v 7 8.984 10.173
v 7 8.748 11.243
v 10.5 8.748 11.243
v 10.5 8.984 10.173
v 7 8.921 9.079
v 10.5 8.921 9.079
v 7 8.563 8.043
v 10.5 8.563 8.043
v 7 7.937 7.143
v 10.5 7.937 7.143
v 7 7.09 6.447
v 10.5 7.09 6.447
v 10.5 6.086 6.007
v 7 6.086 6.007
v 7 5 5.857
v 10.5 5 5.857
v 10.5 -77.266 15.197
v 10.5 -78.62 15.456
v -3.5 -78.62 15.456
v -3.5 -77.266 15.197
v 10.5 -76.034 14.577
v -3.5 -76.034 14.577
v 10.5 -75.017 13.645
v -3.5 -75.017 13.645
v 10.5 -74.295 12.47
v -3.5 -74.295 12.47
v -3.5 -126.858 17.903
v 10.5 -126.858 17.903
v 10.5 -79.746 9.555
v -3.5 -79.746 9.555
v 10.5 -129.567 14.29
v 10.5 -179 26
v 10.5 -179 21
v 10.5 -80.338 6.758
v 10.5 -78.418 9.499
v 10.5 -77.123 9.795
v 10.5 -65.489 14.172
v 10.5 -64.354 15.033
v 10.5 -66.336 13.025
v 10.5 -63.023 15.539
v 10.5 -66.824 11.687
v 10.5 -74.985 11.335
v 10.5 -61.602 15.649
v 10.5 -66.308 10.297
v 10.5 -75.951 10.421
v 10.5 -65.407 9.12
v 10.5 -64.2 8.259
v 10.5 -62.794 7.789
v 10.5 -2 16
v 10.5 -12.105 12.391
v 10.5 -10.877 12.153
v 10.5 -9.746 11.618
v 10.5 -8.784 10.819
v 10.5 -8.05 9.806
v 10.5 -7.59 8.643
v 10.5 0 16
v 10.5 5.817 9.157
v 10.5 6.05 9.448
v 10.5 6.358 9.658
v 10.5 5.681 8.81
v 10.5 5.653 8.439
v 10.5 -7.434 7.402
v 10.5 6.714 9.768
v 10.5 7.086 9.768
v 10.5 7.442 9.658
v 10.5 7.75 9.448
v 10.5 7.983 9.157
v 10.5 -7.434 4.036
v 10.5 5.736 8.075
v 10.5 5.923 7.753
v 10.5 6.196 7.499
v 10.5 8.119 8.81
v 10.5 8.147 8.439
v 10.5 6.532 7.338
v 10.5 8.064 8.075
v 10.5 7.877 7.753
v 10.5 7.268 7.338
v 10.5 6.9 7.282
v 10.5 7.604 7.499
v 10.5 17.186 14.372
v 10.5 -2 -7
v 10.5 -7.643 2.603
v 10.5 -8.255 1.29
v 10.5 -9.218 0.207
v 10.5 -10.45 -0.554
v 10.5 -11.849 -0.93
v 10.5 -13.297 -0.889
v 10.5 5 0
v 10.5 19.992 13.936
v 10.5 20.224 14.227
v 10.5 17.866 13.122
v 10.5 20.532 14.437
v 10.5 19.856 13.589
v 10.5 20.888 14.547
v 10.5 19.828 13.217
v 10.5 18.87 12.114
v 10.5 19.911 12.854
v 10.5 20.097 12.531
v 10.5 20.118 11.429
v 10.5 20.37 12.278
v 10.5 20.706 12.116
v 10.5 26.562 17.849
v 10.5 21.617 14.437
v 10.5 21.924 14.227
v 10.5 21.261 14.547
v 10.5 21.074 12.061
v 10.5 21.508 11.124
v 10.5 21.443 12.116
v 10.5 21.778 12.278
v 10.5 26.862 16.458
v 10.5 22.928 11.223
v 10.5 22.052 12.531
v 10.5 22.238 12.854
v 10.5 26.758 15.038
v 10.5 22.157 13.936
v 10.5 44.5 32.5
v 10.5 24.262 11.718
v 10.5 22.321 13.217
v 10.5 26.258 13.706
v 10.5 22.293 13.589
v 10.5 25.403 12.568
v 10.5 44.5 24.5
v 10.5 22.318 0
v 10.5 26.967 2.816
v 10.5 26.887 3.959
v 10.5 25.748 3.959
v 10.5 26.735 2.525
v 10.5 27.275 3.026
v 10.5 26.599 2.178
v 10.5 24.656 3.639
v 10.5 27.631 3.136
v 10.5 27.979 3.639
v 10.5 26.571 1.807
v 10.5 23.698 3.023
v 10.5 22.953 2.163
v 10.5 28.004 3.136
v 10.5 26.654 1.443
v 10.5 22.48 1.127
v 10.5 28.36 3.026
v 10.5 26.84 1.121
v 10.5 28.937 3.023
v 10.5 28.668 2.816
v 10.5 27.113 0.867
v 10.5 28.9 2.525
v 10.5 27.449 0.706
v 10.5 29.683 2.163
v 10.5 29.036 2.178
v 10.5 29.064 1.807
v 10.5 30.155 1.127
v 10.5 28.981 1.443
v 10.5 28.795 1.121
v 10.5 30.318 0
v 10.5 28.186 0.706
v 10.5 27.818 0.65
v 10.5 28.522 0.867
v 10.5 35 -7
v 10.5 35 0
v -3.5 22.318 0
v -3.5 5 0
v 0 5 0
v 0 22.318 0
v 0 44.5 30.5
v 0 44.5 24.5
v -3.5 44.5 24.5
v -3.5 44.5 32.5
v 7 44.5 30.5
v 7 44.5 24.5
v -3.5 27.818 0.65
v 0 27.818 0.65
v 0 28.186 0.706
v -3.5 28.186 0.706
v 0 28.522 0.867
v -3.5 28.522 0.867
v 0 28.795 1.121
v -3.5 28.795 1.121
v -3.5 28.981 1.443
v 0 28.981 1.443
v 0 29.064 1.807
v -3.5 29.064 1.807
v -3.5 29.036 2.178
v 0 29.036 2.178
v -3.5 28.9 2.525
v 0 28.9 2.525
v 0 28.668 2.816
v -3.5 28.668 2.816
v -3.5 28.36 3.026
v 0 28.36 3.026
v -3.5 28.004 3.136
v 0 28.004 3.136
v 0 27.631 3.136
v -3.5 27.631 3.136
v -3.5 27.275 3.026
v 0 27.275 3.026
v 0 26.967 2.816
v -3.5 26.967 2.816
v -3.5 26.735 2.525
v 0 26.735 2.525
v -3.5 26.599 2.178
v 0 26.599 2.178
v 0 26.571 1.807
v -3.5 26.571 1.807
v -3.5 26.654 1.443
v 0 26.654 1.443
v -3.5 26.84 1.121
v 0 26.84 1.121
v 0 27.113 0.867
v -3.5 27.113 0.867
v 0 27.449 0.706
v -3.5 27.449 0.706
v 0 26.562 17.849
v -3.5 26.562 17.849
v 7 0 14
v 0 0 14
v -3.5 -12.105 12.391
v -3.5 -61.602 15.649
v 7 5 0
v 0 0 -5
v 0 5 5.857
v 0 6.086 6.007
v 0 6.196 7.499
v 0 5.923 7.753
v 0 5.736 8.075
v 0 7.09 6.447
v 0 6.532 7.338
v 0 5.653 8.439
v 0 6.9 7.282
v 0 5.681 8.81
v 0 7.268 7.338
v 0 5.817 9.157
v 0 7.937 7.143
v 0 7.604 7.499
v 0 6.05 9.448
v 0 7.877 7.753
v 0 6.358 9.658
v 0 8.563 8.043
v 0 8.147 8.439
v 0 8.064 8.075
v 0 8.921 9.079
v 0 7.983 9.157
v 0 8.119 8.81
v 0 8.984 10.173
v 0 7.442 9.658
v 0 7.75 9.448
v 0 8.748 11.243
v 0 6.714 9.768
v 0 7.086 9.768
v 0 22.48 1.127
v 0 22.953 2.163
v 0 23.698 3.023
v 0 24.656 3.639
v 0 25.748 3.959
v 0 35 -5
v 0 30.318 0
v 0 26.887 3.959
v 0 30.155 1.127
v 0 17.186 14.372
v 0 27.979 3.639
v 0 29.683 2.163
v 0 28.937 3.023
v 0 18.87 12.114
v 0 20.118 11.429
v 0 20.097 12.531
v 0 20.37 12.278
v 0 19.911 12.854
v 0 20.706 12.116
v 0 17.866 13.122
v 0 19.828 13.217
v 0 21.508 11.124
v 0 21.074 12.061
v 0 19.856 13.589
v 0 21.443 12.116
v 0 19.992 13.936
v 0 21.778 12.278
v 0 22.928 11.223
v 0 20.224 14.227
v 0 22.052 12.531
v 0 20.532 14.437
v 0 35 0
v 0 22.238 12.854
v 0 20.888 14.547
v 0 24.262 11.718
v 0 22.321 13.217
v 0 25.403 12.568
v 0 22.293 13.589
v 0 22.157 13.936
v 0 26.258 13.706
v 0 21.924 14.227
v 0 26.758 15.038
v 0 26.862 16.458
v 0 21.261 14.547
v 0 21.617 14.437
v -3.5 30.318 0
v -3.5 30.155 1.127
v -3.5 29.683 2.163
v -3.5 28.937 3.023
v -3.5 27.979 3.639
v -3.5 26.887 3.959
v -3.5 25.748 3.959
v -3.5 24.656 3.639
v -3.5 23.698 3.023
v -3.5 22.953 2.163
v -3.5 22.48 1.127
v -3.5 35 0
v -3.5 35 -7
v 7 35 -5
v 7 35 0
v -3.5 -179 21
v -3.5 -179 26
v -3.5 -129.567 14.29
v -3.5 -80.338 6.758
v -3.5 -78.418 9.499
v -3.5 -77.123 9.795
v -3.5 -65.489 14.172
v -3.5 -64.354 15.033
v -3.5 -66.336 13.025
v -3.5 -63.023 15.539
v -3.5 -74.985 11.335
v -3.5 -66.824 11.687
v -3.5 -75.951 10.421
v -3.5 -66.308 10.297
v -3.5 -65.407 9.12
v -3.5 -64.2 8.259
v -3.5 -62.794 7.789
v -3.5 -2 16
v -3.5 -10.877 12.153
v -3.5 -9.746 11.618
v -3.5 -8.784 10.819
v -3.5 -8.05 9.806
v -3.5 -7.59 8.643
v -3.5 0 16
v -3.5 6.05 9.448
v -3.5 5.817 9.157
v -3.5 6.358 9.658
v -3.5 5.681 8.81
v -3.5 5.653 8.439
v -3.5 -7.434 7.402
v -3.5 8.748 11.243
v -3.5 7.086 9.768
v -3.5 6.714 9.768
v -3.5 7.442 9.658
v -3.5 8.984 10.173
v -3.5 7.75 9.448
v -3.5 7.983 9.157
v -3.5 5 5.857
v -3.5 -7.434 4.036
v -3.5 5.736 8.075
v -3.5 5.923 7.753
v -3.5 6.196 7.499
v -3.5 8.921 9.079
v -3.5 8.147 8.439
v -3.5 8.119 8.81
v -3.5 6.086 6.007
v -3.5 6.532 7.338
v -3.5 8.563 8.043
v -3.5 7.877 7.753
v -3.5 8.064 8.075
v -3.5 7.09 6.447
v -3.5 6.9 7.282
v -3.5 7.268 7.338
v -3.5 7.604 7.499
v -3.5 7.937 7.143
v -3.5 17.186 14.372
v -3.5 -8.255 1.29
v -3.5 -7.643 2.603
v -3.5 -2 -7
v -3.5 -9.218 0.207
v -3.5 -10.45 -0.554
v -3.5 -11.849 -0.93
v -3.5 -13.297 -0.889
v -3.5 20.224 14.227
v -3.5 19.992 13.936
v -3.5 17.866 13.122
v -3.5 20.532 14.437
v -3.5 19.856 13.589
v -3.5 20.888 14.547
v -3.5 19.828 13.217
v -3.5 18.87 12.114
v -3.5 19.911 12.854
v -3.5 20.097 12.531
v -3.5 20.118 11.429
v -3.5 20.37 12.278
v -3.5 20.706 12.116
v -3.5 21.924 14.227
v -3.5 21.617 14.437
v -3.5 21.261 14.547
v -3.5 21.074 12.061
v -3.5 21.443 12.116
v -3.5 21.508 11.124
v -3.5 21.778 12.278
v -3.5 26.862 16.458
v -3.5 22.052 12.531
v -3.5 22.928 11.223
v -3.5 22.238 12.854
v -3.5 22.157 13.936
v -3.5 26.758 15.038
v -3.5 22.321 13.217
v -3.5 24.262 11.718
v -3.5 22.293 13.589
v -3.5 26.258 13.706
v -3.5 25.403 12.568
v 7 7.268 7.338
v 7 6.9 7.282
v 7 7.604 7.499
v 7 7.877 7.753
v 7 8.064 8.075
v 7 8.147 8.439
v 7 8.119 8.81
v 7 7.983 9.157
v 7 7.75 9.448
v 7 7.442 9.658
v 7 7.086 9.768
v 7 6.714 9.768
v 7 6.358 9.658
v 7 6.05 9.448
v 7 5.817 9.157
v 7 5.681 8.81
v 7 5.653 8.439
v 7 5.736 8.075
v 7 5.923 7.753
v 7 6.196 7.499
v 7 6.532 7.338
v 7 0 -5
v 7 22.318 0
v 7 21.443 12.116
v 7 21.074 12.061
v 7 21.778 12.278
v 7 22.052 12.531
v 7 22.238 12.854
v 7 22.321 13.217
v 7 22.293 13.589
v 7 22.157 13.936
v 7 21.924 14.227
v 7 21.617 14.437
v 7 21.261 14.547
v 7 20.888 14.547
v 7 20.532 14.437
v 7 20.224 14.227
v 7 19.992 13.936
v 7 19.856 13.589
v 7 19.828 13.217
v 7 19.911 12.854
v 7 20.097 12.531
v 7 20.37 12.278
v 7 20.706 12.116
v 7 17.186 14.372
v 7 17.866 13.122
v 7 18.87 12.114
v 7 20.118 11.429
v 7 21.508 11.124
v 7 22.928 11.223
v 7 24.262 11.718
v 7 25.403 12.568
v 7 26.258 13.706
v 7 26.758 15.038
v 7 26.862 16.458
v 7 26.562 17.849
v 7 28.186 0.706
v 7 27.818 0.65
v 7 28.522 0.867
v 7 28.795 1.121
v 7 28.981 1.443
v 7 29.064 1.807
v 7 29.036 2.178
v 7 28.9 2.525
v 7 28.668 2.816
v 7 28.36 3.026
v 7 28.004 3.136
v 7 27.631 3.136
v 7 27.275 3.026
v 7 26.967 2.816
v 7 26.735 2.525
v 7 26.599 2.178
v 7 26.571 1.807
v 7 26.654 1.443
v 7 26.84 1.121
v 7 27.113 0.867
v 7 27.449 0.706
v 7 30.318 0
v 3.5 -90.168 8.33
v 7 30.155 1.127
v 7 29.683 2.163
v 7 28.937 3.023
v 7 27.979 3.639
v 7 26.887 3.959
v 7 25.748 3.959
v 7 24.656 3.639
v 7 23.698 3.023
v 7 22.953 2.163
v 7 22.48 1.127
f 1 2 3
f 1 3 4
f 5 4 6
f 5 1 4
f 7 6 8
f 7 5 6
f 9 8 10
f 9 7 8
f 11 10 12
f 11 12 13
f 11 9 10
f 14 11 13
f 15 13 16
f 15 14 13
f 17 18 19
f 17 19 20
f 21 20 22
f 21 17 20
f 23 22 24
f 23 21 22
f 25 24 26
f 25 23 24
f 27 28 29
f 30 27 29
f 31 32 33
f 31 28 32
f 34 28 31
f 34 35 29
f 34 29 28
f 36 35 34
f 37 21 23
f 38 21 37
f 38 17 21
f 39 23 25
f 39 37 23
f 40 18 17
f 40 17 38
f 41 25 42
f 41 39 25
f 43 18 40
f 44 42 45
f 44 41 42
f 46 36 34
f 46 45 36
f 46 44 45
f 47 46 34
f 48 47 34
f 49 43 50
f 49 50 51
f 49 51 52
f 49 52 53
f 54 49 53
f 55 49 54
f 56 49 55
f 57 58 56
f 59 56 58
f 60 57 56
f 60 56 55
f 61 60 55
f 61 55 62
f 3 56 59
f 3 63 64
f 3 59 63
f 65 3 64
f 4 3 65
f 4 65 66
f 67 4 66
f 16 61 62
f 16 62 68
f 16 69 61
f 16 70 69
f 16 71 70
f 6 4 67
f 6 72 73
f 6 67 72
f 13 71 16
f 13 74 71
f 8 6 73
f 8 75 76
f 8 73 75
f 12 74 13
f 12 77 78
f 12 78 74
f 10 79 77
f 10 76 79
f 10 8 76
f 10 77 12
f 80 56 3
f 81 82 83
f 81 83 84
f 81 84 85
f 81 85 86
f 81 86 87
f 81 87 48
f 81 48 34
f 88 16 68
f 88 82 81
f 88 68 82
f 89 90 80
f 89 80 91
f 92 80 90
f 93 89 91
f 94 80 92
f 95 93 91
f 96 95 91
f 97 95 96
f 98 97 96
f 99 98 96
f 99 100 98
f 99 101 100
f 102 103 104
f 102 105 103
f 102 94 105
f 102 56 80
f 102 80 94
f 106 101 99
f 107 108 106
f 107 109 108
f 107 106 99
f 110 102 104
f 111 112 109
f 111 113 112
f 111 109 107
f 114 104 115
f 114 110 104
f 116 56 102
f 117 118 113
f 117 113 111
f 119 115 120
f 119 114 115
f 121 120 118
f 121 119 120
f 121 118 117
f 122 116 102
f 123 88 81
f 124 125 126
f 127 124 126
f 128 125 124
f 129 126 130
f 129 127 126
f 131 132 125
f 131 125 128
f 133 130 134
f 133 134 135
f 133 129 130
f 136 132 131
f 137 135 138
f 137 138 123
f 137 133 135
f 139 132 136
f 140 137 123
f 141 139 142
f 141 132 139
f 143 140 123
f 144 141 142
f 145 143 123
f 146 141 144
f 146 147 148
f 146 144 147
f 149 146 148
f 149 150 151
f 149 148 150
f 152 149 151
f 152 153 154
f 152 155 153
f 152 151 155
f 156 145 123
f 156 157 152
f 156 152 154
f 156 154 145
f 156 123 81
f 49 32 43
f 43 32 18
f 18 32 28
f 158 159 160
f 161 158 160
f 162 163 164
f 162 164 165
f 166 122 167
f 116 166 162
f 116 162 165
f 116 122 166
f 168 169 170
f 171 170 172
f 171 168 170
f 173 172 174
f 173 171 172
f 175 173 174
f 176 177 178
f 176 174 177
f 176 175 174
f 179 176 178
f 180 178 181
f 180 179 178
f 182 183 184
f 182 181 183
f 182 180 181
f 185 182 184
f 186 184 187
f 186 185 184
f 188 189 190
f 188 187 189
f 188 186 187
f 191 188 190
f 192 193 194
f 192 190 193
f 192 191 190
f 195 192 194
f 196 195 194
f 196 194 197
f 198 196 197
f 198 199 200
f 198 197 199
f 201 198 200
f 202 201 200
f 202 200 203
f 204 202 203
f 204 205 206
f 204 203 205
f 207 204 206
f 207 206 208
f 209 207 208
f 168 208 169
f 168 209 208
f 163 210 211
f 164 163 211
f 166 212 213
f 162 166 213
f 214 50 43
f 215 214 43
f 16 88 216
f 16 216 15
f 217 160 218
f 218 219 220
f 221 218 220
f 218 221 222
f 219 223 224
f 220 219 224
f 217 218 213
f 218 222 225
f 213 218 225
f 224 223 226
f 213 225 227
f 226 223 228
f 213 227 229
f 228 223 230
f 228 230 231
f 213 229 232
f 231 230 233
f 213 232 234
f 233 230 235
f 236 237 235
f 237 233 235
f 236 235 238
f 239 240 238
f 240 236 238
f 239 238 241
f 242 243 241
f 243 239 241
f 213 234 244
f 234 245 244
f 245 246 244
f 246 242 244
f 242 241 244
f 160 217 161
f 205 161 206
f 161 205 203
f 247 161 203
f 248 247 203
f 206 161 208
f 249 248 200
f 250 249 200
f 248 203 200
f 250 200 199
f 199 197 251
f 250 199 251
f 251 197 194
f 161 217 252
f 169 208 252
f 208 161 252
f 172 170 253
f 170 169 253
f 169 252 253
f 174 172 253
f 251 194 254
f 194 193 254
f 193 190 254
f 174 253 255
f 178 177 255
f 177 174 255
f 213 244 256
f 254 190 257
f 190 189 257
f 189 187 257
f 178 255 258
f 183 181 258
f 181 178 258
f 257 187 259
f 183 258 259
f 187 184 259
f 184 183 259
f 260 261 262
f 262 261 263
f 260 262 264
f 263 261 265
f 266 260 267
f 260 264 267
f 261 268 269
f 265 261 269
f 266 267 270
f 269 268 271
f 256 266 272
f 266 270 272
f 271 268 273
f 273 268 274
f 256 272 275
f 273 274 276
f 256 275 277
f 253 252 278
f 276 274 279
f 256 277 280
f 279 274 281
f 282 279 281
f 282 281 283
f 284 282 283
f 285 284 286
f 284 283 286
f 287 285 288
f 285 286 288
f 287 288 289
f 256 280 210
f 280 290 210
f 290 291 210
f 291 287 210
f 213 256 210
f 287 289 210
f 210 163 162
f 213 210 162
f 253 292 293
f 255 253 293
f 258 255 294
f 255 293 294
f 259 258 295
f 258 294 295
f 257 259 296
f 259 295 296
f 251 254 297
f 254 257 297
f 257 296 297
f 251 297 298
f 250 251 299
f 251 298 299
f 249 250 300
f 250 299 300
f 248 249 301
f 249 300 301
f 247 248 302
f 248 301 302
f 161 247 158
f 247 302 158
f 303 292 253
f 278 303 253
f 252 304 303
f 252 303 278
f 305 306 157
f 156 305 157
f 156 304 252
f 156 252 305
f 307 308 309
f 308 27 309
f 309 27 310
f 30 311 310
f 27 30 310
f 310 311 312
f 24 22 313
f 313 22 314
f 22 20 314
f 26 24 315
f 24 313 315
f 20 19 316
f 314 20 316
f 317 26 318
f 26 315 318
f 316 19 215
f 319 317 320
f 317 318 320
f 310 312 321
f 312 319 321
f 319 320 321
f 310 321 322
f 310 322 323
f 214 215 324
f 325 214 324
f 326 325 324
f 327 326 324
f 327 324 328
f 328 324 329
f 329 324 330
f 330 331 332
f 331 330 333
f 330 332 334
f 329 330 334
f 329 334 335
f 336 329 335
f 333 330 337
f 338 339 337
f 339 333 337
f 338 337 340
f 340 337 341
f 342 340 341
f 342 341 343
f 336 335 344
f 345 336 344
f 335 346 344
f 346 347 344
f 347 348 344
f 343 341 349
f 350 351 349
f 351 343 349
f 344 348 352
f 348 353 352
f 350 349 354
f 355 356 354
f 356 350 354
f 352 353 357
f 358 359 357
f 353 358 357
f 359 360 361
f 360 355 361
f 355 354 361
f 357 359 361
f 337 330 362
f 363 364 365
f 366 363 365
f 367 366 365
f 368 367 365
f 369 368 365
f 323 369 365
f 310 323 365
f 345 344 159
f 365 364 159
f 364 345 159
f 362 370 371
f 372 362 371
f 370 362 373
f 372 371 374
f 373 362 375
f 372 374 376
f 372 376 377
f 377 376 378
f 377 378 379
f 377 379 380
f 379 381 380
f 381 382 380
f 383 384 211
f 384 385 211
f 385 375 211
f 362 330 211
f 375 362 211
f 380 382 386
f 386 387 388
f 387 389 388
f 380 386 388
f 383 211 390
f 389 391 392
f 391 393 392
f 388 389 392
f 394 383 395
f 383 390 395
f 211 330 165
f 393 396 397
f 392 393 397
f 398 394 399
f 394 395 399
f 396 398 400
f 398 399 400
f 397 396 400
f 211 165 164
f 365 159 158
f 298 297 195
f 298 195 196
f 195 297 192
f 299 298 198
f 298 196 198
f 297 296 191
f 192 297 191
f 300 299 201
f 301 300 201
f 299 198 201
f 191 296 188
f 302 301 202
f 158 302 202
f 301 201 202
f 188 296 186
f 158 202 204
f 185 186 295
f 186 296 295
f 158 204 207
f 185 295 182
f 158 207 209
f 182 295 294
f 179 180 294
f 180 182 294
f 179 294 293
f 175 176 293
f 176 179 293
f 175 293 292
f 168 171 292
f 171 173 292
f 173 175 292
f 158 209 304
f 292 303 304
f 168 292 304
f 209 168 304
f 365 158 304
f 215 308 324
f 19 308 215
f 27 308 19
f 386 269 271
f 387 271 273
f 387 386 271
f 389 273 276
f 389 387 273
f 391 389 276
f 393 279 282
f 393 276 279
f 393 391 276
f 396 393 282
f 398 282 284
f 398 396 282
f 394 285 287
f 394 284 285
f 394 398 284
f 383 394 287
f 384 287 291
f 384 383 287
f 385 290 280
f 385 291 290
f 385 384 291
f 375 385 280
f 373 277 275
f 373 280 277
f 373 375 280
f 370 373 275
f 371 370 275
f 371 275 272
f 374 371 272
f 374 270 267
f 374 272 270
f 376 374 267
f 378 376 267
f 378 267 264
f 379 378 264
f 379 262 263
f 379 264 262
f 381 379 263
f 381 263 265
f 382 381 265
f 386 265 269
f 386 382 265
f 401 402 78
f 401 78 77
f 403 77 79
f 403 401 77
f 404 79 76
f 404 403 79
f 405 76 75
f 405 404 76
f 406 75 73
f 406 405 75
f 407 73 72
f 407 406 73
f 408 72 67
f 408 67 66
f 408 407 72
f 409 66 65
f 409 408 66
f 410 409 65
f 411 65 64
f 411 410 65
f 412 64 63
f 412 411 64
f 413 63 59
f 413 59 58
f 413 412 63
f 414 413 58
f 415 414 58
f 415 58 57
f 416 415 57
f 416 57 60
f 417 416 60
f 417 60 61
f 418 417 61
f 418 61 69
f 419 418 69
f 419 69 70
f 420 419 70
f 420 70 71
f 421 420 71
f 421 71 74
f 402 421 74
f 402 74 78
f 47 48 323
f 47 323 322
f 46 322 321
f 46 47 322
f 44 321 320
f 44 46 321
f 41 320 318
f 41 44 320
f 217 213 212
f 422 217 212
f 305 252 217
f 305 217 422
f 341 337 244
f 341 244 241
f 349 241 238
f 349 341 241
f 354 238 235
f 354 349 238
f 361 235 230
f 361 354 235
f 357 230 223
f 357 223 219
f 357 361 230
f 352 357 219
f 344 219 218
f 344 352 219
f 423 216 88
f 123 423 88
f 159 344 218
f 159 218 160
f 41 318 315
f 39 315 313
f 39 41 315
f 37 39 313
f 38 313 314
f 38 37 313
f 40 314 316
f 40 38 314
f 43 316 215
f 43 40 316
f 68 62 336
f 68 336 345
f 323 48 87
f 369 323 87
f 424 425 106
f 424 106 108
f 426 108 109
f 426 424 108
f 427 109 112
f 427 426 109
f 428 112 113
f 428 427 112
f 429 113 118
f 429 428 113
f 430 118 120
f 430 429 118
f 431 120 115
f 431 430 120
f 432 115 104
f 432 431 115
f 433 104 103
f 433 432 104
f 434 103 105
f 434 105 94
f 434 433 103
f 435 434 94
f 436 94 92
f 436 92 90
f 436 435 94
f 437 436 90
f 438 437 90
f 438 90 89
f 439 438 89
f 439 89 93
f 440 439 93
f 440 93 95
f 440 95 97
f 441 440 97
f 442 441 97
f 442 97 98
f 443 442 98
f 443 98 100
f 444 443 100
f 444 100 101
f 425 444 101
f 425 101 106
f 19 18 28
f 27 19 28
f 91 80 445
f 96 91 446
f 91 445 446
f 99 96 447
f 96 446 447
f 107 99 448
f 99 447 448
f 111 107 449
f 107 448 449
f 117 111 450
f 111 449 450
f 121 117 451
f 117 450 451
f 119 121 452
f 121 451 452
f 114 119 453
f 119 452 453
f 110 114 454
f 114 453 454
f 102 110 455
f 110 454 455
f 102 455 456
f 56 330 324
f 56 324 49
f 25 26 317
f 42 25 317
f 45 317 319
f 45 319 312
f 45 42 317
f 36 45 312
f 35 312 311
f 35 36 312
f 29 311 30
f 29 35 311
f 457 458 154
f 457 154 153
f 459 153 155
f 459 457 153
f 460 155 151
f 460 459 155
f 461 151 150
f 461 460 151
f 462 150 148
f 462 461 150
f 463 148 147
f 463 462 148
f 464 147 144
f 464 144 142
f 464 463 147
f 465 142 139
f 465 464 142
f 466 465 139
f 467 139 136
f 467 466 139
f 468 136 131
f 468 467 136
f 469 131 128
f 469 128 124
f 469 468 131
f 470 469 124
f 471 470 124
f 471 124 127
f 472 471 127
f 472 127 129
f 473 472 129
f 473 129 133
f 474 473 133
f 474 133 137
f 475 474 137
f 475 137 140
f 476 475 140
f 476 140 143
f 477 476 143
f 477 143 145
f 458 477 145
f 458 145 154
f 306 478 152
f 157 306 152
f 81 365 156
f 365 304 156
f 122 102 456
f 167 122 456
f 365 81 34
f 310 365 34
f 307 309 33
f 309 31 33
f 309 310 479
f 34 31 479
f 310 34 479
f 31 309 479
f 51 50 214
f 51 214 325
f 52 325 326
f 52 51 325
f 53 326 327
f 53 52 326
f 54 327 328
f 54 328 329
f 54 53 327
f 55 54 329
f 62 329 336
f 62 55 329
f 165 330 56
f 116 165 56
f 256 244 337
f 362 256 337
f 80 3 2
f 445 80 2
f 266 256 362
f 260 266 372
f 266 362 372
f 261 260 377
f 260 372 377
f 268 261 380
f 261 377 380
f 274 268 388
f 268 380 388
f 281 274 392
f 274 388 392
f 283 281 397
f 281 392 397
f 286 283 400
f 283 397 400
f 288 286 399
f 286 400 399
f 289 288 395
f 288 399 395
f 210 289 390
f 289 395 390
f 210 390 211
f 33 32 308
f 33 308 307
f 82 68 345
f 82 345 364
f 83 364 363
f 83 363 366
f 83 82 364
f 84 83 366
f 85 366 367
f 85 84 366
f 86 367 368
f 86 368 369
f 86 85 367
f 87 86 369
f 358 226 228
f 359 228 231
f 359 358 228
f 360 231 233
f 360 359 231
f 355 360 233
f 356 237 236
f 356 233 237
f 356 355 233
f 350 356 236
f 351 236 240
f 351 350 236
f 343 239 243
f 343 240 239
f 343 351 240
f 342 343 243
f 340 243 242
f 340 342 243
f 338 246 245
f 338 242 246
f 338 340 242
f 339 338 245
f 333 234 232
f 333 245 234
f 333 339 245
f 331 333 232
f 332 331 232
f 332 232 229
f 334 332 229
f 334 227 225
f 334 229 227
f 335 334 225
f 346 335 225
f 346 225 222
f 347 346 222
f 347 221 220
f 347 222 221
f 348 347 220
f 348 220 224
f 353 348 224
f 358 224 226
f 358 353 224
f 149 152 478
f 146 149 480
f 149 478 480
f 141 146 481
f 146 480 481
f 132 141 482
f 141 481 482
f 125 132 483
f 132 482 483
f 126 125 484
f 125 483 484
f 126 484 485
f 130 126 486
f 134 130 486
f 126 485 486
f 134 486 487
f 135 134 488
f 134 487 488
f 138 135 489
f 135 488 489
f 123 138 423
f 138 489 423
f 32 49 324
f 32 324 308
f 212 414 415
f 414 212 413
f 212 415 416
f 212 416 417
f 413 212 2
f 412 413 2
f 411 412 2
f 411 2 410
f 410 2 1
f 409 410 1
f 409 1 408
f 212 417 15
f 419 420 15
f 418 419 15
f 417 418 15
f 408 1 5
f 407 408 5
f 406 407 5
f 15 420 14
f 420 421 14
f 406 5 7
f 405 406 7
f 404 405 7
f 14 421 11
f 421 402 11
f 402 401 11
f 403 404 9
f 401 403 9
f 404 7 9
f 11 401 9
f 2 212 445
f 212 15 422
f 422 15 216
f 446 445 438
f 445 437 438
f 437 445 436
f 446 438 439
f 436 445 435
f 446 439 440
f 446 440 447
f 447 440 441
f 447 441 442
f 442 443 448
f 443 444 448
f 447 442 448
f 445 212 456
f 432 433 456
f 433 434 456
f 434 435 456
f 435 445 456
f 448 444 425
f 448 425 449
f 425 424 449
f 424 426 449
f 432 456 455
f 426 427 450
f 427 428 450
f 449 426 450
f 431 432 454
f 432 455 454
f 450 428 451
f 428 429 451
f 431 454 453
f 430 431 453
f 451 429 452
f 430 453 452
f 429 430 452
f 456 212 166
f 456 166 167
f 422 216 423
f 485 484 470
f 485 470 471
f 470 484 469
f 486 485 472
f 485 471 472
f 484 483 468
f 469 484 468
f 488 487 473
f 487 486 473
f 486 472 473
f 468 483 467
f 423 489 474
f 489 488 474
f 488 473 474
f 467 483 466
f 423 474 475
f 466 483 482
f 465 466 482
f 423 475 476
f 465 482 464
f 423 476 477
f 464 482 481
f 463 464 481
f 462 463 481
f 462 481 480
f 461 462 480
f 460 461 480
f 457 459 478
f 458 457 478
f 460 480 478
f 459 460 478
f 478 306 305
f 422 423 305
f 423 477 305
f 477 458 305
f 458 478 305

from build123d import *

# Parameters (mm, degrees)
BOSS_EXTRUDE1_DEPTH  = 35
SKETCH6_W            = 14
SKETCH6_H            = 23
BOSS_EXTRUDE6_DEPTH  = 2
BOSS_EXTRUDE8_DEPTH  = 3.5
BOSS_EXTRUDE9_START  = -14
SKETCH14_R           = 1.25
BOSS_EXTRUDE9_DEPTH  = 14
BOSS_EXTRUDE10_DEPTH = 3.5
BOSS_EXTRUDE11_START = -14
SKETCH16_R           = 1.25
BOSS_EXTRUDE11_DEPTH = 14
BOSS_EXTRUDE12_START = -14
SKETCH18_R           = 1.25
BOSS_EXTRUDE12_DEPTH = 14
SKETCH19_W           = 7
SKETCH19_H           = 19
CUT_EXTRUDE5_DEPTH   = 57.095900028
SKETCH20_W           = 7
SKETCH20_H           = 47.4605099
CUT_EXTRUDE6_DEPTH   = 10
BOSS_EXTRUDE13_DEPTH = 14
FILLET1_R            = 5


with BuildPart() as part:
    # Sketch1 → Boss-Extrude1 (new body)
    with BuildSketch(Plane(origin=(0, 0, 0), x_dir=(1, 0, 0), z_dir=(0, 1, 0))):
        Polygon((7, 0), (10.5, 0), (10.5, 7), (-3.5, 7), (-3.5, 0), (0, 0), (0, 5), (7, 5), align=None)
    extrude(amount=BOSS_EXTRUDE1_DEPTH)

    # Sketch6 → Boss-Extrude6 (add)
    with BuildSketch(Plane.XZ):
        with Locations((3.5, 4.5)):
            Rectangle(SKETCH6_W, SKETCH6_H)
    extrude(amount=BOSS_EXTRUDE6_DEPTH)

    # Sweep1: sweep along a path in Sketch8
    with BuildLine(Plane(origin=(10.5, 0, 0), x_dir=(0, 0, -1), z_dir=(1, 0, 0))) as sweep1_path:
        Line((-32.5, 44.5), (-16, 0))
    # Sketch7 → Sweep1 (sweep)
    with BuildSketch(Plane(origin=(0, 0, 0), x_dir=(1, 0, 0), z_dir=(0, 1, 0))):
        Polygon((-3.5, -16), (10.5, -16), (10.5, -8), (7, -8), (7, -14), (0, -14), (0, -8), (-3.5, -8), align=None)
    sweep(path=sweep1_path.line)

    # Sketch13 → Boss-Extrude8 (add)
    with BuildSketch(Plane(origin=(10.5, 0, 0), x_dir=(0, 0, -1), z_dir=(1, 0, 0))):
        Polygon((-8, 0), (0, 0), (0, 5), (-9.853932584, 5), align=None)
    extrude(amount=-BOSS_EXTRUDE8_DEPTH)

    # Sketch14 → Boss-Extrude9 (add)
    with BuildSketch(Plane(origin=(10.5, 0, 0), x_dir=(0, 0, -1), z_dir=(1, 0, 0)).offset(BOSS_EXTRUDE9_START)):
        with BuildLine():
            Line((-9.853932584, 5), (-11.243474968, 8.747553701))
            ThreePointArc((-11.243474968, 8.747553701), (-7.571262705, 8.280915268), (-5.85706046, 5))
            Line((-5.85706046, 5), (-9.853932584, 5))
        make_face()
        with Locations((-8.532023173, 6.9)):
            Circle(SKETCH14_R, mode=Mode.SUBTRACT)
    extrude(amount=BOSS_EXTRUDE9_DEPTH)

    # Sketch15 → Boss-Extrude10 (add)
    with BuildSketch(Plane.ZY.offset(3.5)):
        Polygon((0, 0), (8, 0), (9.853932584, 5), (0, 5), align=None)
    extrude(amount=-BOSS_EXTRUDE10_DEPTH)

    # Sketch16 → Boss-Extrude11 (add)
    with BuildSketch(Plane(origin=(10.5, 0, 0), x_dir=(0, 0, -1), z_dir=(1, 0, 0)).offset(BOSS_EXTRUDE11_START)):
        with BuildLine():
            ThreePointArc((0, 30.317524518), (-4, 26.317524518), (0, 22.317524518))
            Line((0, 22.317524518), (0, 26.317524518))
            Line((0, 26.317524518), (0, 30.317524518))
        make_face()
        with Locations((-1.9, 27.817524518)):
            Circle(SKETCH16_R, mode=Mode.SUBTRACT)
    extrude(amount=BOSS_EXTRUDE11_DEPTH)

    # Sketch18 → Boss-Extrude12 (add)
    with BuildSketch(Plane(origin=(10.5, 0, 0), x_dir=(0, 0, -1), z_dir=(1, 0, 0)).offset(BOSS_EXTRUDE12_START)):
        with BuildLine():
            Line((-17.848966579, 26.562364409), (-14.372392047, 17.186148247))
            ThreePointArc((-14.372392047, 17.186148247), (-11.422571232, 23.612543594), (-17.848966579, 26.562364409))
        make_face()
        with Locations((-13.310679313, 21.074256328)):
            Circle(SKETCH18_R, mode=Mode.SUBTRACT)
    extrude(amount=BOSS_EXTRUDE12_DEPTH)

    # Sketch19 → Cut-Extrude5 (cut, through all)
    with BuildSketch(Plane(origin=(0, 0, 0), x_dir=(1, 0, 0), z_dir=(0, 1, 0))):
        with Locations((3.5, -4.5)):
            Rectangle(SKETCH19_W, SKETCH19_H)
    extrude(amount=CUT_EXTRUDE5_DEPTH, mode=Mode.SUBTRACT)

    # Sketch20 → Cut-Extrude6 (cut)
    with BuildSketch(Plane(origin=(0, -4.563596004, 12.307880133), x_dir=(-1, 0, 0), z_dir=(0, 0.3476574532100169, -0.9376216162330756))):
        with Locations((-3.5, 28.597459295)):
            Rectangle(SKETCH20_W, SKETCH20_H)
    extrude(amount=CUT_EXTRUDE6_DEPTH, mode=Mode.SUBTRACT)

    # Sketch9 → Boss-Extrude13 (add)
    with BuildSketch(Plane(origin=(10.5, 0, 0), x_dir=(0, 0, -1), z_dir=(1, 0, 0))):
        with BuildLine():
            Line((-16, -2), (-26, -179))
            Line((-26, -179), (-21, -179))
            add(Edge.make_bspline(
                [(7, -2), (-9.660155009, -89.83535791), (-21, -179)],
                knots=[0, 0, 0, 0.89649965, 0.89649965, 0.89649965], degree=2))
            Line((7, -2), (-16, -2))
        make_face()
        Polygon((-5.08325747, -7.433503799), (-12.08325747, -7.433503799), (-16, -66.930407946), (-8.514117769, -66.930407946), (1.91674253, -7.433503799), align=None, mode=Mode.SUBTRACT)
        Polygon((-12.215264572, -73.873780488), (-15.215264572, -73.873780488), (-17.9028805, -126.858413083), (-8.514117769, -73.873780488), align=None, mode=Mode.SUBTRACT)
    extrude(amount=-BOSS_EXTRUDE13_DEPTH)

    # Fillet1
    # the kernel refuses this fillet: 5 mm, written as the material it adds along each edge
    with BuildSketch(Plane(origin=(10.5, -73.873780488, 8.514117769), x_dir=(0, 0, 1), z_dir=(-1, 0, 0))) as fillet1_piece_1:
        with BuildLine():
            CenterArc((FILLET1_R * 1.19277604339, -FILLET1_R), FILLET1_R, 90, 100.048385075)
            Line((FILLET1_R * 0.208115283733, -FILLET1_R * 1.17447976499), (0, 0))
            Line((0, 0), (FILLET1_R * 1.19277604339, 0))
        make_face()
    extrude(amount=14)
    with BuildSketch(Plane(origin=(10.5, -73.873780488, 15.215264572), x_dir=(0, 0, -1), z_dir=(-1, 0, 0))) as fillet1_piece_2:
        with BuildLine():
            CenterArc((FILLET1_R * 0.950561215954, FILLET1_R), FILLET1_R, 182.903807688, 87.096192312)
            Line((-FILLET1_R * 0.048154776785, FILLET1_R * 0.949340688451), (0, 0))
            Line((0, 0), (FILLET1_R * 0.950561215954, 0))
        make_face()
    extrude(amount=14)
    with BuildSketch(Plane(origin=(10.5, -66.930407946, 16), x_dir=(0, 0, -1), z_dir=(-1, 0, 0))) as fillet1_piece_3:
        with BuildLine():
            CenterArc((FILLET1_R * 1.06799555055, -FILLET1_R), FILLET1_R, 90, 93.766405645)
            Line((FILLET1_R * 0.0701553952566, -FILLET1_R * 1.06568884601), (0, 0))
            Line((0, 0), (FILLET1_R * 1.06799555055, 0))
        make_face()
    extrude(amount=14)
    with BuildSketch(Plane(origin=(10.5, -66.930407946, 8.514117769), x_dir=(0, 0.9849772856062504, -0.17268395073006315), z_dir=(-1, 0, 0))) as fillet1_piece_4:
        with BuildLine():
            CenterArc((FILLET1_R * 0.839934139964, -FILLET1_R), FILLET1_R, 90, 80.056093562)
            Line((-FILLET1_R * 0.145043145642, -FILLET1_R * 0.82731604927), (0, 0))
            Line((0, 0), (FILLET1_R * 0.839934139964, 0))
        make_face()
    extrude(amount=14)
    with BuildSketch(Plane(origin=(10.5, -7.433503799, 12.08325747), x_dir=(0, 0, -1), z_dir=(-1, 0, 0))) as fillet1_piece_5:
        with BuildLine():
            CenterArc((FILLET1_R * 0.936333488925, FILLET1_R), FILLET1_R, 183.766405645, 86.233594355)
            Line((-FILLET1_R * 0.0615066663657, FILLET1_R * 0.934311153992), (0, 0))
            Line((0, 0), (FILLET1_R * 0.936333488925, 0))
        make_face()
    extrude(amount=14)
    with BuildSketch(Plane(origin=(10.5, -7.433503799, -1.91674253), x_dir=(0, 0, 1), z_dir=(-1, 0, 0))) as fillet1_piece_6:
        with BuildLine():
            CenterArc((FILLET1_R * 1.19056953685, -FILLET1_R), FILLET1_R, 90, 99.943906438)
            Line((FILLET1_R * 0.205592251242, -FILLET1_R * 1.17268395073), (0, 0))
            Line((0, 0), (FILLET1_R * 1.19056953685, 0))
        make_face()
    extrude(amount=14)


solid = part.part
